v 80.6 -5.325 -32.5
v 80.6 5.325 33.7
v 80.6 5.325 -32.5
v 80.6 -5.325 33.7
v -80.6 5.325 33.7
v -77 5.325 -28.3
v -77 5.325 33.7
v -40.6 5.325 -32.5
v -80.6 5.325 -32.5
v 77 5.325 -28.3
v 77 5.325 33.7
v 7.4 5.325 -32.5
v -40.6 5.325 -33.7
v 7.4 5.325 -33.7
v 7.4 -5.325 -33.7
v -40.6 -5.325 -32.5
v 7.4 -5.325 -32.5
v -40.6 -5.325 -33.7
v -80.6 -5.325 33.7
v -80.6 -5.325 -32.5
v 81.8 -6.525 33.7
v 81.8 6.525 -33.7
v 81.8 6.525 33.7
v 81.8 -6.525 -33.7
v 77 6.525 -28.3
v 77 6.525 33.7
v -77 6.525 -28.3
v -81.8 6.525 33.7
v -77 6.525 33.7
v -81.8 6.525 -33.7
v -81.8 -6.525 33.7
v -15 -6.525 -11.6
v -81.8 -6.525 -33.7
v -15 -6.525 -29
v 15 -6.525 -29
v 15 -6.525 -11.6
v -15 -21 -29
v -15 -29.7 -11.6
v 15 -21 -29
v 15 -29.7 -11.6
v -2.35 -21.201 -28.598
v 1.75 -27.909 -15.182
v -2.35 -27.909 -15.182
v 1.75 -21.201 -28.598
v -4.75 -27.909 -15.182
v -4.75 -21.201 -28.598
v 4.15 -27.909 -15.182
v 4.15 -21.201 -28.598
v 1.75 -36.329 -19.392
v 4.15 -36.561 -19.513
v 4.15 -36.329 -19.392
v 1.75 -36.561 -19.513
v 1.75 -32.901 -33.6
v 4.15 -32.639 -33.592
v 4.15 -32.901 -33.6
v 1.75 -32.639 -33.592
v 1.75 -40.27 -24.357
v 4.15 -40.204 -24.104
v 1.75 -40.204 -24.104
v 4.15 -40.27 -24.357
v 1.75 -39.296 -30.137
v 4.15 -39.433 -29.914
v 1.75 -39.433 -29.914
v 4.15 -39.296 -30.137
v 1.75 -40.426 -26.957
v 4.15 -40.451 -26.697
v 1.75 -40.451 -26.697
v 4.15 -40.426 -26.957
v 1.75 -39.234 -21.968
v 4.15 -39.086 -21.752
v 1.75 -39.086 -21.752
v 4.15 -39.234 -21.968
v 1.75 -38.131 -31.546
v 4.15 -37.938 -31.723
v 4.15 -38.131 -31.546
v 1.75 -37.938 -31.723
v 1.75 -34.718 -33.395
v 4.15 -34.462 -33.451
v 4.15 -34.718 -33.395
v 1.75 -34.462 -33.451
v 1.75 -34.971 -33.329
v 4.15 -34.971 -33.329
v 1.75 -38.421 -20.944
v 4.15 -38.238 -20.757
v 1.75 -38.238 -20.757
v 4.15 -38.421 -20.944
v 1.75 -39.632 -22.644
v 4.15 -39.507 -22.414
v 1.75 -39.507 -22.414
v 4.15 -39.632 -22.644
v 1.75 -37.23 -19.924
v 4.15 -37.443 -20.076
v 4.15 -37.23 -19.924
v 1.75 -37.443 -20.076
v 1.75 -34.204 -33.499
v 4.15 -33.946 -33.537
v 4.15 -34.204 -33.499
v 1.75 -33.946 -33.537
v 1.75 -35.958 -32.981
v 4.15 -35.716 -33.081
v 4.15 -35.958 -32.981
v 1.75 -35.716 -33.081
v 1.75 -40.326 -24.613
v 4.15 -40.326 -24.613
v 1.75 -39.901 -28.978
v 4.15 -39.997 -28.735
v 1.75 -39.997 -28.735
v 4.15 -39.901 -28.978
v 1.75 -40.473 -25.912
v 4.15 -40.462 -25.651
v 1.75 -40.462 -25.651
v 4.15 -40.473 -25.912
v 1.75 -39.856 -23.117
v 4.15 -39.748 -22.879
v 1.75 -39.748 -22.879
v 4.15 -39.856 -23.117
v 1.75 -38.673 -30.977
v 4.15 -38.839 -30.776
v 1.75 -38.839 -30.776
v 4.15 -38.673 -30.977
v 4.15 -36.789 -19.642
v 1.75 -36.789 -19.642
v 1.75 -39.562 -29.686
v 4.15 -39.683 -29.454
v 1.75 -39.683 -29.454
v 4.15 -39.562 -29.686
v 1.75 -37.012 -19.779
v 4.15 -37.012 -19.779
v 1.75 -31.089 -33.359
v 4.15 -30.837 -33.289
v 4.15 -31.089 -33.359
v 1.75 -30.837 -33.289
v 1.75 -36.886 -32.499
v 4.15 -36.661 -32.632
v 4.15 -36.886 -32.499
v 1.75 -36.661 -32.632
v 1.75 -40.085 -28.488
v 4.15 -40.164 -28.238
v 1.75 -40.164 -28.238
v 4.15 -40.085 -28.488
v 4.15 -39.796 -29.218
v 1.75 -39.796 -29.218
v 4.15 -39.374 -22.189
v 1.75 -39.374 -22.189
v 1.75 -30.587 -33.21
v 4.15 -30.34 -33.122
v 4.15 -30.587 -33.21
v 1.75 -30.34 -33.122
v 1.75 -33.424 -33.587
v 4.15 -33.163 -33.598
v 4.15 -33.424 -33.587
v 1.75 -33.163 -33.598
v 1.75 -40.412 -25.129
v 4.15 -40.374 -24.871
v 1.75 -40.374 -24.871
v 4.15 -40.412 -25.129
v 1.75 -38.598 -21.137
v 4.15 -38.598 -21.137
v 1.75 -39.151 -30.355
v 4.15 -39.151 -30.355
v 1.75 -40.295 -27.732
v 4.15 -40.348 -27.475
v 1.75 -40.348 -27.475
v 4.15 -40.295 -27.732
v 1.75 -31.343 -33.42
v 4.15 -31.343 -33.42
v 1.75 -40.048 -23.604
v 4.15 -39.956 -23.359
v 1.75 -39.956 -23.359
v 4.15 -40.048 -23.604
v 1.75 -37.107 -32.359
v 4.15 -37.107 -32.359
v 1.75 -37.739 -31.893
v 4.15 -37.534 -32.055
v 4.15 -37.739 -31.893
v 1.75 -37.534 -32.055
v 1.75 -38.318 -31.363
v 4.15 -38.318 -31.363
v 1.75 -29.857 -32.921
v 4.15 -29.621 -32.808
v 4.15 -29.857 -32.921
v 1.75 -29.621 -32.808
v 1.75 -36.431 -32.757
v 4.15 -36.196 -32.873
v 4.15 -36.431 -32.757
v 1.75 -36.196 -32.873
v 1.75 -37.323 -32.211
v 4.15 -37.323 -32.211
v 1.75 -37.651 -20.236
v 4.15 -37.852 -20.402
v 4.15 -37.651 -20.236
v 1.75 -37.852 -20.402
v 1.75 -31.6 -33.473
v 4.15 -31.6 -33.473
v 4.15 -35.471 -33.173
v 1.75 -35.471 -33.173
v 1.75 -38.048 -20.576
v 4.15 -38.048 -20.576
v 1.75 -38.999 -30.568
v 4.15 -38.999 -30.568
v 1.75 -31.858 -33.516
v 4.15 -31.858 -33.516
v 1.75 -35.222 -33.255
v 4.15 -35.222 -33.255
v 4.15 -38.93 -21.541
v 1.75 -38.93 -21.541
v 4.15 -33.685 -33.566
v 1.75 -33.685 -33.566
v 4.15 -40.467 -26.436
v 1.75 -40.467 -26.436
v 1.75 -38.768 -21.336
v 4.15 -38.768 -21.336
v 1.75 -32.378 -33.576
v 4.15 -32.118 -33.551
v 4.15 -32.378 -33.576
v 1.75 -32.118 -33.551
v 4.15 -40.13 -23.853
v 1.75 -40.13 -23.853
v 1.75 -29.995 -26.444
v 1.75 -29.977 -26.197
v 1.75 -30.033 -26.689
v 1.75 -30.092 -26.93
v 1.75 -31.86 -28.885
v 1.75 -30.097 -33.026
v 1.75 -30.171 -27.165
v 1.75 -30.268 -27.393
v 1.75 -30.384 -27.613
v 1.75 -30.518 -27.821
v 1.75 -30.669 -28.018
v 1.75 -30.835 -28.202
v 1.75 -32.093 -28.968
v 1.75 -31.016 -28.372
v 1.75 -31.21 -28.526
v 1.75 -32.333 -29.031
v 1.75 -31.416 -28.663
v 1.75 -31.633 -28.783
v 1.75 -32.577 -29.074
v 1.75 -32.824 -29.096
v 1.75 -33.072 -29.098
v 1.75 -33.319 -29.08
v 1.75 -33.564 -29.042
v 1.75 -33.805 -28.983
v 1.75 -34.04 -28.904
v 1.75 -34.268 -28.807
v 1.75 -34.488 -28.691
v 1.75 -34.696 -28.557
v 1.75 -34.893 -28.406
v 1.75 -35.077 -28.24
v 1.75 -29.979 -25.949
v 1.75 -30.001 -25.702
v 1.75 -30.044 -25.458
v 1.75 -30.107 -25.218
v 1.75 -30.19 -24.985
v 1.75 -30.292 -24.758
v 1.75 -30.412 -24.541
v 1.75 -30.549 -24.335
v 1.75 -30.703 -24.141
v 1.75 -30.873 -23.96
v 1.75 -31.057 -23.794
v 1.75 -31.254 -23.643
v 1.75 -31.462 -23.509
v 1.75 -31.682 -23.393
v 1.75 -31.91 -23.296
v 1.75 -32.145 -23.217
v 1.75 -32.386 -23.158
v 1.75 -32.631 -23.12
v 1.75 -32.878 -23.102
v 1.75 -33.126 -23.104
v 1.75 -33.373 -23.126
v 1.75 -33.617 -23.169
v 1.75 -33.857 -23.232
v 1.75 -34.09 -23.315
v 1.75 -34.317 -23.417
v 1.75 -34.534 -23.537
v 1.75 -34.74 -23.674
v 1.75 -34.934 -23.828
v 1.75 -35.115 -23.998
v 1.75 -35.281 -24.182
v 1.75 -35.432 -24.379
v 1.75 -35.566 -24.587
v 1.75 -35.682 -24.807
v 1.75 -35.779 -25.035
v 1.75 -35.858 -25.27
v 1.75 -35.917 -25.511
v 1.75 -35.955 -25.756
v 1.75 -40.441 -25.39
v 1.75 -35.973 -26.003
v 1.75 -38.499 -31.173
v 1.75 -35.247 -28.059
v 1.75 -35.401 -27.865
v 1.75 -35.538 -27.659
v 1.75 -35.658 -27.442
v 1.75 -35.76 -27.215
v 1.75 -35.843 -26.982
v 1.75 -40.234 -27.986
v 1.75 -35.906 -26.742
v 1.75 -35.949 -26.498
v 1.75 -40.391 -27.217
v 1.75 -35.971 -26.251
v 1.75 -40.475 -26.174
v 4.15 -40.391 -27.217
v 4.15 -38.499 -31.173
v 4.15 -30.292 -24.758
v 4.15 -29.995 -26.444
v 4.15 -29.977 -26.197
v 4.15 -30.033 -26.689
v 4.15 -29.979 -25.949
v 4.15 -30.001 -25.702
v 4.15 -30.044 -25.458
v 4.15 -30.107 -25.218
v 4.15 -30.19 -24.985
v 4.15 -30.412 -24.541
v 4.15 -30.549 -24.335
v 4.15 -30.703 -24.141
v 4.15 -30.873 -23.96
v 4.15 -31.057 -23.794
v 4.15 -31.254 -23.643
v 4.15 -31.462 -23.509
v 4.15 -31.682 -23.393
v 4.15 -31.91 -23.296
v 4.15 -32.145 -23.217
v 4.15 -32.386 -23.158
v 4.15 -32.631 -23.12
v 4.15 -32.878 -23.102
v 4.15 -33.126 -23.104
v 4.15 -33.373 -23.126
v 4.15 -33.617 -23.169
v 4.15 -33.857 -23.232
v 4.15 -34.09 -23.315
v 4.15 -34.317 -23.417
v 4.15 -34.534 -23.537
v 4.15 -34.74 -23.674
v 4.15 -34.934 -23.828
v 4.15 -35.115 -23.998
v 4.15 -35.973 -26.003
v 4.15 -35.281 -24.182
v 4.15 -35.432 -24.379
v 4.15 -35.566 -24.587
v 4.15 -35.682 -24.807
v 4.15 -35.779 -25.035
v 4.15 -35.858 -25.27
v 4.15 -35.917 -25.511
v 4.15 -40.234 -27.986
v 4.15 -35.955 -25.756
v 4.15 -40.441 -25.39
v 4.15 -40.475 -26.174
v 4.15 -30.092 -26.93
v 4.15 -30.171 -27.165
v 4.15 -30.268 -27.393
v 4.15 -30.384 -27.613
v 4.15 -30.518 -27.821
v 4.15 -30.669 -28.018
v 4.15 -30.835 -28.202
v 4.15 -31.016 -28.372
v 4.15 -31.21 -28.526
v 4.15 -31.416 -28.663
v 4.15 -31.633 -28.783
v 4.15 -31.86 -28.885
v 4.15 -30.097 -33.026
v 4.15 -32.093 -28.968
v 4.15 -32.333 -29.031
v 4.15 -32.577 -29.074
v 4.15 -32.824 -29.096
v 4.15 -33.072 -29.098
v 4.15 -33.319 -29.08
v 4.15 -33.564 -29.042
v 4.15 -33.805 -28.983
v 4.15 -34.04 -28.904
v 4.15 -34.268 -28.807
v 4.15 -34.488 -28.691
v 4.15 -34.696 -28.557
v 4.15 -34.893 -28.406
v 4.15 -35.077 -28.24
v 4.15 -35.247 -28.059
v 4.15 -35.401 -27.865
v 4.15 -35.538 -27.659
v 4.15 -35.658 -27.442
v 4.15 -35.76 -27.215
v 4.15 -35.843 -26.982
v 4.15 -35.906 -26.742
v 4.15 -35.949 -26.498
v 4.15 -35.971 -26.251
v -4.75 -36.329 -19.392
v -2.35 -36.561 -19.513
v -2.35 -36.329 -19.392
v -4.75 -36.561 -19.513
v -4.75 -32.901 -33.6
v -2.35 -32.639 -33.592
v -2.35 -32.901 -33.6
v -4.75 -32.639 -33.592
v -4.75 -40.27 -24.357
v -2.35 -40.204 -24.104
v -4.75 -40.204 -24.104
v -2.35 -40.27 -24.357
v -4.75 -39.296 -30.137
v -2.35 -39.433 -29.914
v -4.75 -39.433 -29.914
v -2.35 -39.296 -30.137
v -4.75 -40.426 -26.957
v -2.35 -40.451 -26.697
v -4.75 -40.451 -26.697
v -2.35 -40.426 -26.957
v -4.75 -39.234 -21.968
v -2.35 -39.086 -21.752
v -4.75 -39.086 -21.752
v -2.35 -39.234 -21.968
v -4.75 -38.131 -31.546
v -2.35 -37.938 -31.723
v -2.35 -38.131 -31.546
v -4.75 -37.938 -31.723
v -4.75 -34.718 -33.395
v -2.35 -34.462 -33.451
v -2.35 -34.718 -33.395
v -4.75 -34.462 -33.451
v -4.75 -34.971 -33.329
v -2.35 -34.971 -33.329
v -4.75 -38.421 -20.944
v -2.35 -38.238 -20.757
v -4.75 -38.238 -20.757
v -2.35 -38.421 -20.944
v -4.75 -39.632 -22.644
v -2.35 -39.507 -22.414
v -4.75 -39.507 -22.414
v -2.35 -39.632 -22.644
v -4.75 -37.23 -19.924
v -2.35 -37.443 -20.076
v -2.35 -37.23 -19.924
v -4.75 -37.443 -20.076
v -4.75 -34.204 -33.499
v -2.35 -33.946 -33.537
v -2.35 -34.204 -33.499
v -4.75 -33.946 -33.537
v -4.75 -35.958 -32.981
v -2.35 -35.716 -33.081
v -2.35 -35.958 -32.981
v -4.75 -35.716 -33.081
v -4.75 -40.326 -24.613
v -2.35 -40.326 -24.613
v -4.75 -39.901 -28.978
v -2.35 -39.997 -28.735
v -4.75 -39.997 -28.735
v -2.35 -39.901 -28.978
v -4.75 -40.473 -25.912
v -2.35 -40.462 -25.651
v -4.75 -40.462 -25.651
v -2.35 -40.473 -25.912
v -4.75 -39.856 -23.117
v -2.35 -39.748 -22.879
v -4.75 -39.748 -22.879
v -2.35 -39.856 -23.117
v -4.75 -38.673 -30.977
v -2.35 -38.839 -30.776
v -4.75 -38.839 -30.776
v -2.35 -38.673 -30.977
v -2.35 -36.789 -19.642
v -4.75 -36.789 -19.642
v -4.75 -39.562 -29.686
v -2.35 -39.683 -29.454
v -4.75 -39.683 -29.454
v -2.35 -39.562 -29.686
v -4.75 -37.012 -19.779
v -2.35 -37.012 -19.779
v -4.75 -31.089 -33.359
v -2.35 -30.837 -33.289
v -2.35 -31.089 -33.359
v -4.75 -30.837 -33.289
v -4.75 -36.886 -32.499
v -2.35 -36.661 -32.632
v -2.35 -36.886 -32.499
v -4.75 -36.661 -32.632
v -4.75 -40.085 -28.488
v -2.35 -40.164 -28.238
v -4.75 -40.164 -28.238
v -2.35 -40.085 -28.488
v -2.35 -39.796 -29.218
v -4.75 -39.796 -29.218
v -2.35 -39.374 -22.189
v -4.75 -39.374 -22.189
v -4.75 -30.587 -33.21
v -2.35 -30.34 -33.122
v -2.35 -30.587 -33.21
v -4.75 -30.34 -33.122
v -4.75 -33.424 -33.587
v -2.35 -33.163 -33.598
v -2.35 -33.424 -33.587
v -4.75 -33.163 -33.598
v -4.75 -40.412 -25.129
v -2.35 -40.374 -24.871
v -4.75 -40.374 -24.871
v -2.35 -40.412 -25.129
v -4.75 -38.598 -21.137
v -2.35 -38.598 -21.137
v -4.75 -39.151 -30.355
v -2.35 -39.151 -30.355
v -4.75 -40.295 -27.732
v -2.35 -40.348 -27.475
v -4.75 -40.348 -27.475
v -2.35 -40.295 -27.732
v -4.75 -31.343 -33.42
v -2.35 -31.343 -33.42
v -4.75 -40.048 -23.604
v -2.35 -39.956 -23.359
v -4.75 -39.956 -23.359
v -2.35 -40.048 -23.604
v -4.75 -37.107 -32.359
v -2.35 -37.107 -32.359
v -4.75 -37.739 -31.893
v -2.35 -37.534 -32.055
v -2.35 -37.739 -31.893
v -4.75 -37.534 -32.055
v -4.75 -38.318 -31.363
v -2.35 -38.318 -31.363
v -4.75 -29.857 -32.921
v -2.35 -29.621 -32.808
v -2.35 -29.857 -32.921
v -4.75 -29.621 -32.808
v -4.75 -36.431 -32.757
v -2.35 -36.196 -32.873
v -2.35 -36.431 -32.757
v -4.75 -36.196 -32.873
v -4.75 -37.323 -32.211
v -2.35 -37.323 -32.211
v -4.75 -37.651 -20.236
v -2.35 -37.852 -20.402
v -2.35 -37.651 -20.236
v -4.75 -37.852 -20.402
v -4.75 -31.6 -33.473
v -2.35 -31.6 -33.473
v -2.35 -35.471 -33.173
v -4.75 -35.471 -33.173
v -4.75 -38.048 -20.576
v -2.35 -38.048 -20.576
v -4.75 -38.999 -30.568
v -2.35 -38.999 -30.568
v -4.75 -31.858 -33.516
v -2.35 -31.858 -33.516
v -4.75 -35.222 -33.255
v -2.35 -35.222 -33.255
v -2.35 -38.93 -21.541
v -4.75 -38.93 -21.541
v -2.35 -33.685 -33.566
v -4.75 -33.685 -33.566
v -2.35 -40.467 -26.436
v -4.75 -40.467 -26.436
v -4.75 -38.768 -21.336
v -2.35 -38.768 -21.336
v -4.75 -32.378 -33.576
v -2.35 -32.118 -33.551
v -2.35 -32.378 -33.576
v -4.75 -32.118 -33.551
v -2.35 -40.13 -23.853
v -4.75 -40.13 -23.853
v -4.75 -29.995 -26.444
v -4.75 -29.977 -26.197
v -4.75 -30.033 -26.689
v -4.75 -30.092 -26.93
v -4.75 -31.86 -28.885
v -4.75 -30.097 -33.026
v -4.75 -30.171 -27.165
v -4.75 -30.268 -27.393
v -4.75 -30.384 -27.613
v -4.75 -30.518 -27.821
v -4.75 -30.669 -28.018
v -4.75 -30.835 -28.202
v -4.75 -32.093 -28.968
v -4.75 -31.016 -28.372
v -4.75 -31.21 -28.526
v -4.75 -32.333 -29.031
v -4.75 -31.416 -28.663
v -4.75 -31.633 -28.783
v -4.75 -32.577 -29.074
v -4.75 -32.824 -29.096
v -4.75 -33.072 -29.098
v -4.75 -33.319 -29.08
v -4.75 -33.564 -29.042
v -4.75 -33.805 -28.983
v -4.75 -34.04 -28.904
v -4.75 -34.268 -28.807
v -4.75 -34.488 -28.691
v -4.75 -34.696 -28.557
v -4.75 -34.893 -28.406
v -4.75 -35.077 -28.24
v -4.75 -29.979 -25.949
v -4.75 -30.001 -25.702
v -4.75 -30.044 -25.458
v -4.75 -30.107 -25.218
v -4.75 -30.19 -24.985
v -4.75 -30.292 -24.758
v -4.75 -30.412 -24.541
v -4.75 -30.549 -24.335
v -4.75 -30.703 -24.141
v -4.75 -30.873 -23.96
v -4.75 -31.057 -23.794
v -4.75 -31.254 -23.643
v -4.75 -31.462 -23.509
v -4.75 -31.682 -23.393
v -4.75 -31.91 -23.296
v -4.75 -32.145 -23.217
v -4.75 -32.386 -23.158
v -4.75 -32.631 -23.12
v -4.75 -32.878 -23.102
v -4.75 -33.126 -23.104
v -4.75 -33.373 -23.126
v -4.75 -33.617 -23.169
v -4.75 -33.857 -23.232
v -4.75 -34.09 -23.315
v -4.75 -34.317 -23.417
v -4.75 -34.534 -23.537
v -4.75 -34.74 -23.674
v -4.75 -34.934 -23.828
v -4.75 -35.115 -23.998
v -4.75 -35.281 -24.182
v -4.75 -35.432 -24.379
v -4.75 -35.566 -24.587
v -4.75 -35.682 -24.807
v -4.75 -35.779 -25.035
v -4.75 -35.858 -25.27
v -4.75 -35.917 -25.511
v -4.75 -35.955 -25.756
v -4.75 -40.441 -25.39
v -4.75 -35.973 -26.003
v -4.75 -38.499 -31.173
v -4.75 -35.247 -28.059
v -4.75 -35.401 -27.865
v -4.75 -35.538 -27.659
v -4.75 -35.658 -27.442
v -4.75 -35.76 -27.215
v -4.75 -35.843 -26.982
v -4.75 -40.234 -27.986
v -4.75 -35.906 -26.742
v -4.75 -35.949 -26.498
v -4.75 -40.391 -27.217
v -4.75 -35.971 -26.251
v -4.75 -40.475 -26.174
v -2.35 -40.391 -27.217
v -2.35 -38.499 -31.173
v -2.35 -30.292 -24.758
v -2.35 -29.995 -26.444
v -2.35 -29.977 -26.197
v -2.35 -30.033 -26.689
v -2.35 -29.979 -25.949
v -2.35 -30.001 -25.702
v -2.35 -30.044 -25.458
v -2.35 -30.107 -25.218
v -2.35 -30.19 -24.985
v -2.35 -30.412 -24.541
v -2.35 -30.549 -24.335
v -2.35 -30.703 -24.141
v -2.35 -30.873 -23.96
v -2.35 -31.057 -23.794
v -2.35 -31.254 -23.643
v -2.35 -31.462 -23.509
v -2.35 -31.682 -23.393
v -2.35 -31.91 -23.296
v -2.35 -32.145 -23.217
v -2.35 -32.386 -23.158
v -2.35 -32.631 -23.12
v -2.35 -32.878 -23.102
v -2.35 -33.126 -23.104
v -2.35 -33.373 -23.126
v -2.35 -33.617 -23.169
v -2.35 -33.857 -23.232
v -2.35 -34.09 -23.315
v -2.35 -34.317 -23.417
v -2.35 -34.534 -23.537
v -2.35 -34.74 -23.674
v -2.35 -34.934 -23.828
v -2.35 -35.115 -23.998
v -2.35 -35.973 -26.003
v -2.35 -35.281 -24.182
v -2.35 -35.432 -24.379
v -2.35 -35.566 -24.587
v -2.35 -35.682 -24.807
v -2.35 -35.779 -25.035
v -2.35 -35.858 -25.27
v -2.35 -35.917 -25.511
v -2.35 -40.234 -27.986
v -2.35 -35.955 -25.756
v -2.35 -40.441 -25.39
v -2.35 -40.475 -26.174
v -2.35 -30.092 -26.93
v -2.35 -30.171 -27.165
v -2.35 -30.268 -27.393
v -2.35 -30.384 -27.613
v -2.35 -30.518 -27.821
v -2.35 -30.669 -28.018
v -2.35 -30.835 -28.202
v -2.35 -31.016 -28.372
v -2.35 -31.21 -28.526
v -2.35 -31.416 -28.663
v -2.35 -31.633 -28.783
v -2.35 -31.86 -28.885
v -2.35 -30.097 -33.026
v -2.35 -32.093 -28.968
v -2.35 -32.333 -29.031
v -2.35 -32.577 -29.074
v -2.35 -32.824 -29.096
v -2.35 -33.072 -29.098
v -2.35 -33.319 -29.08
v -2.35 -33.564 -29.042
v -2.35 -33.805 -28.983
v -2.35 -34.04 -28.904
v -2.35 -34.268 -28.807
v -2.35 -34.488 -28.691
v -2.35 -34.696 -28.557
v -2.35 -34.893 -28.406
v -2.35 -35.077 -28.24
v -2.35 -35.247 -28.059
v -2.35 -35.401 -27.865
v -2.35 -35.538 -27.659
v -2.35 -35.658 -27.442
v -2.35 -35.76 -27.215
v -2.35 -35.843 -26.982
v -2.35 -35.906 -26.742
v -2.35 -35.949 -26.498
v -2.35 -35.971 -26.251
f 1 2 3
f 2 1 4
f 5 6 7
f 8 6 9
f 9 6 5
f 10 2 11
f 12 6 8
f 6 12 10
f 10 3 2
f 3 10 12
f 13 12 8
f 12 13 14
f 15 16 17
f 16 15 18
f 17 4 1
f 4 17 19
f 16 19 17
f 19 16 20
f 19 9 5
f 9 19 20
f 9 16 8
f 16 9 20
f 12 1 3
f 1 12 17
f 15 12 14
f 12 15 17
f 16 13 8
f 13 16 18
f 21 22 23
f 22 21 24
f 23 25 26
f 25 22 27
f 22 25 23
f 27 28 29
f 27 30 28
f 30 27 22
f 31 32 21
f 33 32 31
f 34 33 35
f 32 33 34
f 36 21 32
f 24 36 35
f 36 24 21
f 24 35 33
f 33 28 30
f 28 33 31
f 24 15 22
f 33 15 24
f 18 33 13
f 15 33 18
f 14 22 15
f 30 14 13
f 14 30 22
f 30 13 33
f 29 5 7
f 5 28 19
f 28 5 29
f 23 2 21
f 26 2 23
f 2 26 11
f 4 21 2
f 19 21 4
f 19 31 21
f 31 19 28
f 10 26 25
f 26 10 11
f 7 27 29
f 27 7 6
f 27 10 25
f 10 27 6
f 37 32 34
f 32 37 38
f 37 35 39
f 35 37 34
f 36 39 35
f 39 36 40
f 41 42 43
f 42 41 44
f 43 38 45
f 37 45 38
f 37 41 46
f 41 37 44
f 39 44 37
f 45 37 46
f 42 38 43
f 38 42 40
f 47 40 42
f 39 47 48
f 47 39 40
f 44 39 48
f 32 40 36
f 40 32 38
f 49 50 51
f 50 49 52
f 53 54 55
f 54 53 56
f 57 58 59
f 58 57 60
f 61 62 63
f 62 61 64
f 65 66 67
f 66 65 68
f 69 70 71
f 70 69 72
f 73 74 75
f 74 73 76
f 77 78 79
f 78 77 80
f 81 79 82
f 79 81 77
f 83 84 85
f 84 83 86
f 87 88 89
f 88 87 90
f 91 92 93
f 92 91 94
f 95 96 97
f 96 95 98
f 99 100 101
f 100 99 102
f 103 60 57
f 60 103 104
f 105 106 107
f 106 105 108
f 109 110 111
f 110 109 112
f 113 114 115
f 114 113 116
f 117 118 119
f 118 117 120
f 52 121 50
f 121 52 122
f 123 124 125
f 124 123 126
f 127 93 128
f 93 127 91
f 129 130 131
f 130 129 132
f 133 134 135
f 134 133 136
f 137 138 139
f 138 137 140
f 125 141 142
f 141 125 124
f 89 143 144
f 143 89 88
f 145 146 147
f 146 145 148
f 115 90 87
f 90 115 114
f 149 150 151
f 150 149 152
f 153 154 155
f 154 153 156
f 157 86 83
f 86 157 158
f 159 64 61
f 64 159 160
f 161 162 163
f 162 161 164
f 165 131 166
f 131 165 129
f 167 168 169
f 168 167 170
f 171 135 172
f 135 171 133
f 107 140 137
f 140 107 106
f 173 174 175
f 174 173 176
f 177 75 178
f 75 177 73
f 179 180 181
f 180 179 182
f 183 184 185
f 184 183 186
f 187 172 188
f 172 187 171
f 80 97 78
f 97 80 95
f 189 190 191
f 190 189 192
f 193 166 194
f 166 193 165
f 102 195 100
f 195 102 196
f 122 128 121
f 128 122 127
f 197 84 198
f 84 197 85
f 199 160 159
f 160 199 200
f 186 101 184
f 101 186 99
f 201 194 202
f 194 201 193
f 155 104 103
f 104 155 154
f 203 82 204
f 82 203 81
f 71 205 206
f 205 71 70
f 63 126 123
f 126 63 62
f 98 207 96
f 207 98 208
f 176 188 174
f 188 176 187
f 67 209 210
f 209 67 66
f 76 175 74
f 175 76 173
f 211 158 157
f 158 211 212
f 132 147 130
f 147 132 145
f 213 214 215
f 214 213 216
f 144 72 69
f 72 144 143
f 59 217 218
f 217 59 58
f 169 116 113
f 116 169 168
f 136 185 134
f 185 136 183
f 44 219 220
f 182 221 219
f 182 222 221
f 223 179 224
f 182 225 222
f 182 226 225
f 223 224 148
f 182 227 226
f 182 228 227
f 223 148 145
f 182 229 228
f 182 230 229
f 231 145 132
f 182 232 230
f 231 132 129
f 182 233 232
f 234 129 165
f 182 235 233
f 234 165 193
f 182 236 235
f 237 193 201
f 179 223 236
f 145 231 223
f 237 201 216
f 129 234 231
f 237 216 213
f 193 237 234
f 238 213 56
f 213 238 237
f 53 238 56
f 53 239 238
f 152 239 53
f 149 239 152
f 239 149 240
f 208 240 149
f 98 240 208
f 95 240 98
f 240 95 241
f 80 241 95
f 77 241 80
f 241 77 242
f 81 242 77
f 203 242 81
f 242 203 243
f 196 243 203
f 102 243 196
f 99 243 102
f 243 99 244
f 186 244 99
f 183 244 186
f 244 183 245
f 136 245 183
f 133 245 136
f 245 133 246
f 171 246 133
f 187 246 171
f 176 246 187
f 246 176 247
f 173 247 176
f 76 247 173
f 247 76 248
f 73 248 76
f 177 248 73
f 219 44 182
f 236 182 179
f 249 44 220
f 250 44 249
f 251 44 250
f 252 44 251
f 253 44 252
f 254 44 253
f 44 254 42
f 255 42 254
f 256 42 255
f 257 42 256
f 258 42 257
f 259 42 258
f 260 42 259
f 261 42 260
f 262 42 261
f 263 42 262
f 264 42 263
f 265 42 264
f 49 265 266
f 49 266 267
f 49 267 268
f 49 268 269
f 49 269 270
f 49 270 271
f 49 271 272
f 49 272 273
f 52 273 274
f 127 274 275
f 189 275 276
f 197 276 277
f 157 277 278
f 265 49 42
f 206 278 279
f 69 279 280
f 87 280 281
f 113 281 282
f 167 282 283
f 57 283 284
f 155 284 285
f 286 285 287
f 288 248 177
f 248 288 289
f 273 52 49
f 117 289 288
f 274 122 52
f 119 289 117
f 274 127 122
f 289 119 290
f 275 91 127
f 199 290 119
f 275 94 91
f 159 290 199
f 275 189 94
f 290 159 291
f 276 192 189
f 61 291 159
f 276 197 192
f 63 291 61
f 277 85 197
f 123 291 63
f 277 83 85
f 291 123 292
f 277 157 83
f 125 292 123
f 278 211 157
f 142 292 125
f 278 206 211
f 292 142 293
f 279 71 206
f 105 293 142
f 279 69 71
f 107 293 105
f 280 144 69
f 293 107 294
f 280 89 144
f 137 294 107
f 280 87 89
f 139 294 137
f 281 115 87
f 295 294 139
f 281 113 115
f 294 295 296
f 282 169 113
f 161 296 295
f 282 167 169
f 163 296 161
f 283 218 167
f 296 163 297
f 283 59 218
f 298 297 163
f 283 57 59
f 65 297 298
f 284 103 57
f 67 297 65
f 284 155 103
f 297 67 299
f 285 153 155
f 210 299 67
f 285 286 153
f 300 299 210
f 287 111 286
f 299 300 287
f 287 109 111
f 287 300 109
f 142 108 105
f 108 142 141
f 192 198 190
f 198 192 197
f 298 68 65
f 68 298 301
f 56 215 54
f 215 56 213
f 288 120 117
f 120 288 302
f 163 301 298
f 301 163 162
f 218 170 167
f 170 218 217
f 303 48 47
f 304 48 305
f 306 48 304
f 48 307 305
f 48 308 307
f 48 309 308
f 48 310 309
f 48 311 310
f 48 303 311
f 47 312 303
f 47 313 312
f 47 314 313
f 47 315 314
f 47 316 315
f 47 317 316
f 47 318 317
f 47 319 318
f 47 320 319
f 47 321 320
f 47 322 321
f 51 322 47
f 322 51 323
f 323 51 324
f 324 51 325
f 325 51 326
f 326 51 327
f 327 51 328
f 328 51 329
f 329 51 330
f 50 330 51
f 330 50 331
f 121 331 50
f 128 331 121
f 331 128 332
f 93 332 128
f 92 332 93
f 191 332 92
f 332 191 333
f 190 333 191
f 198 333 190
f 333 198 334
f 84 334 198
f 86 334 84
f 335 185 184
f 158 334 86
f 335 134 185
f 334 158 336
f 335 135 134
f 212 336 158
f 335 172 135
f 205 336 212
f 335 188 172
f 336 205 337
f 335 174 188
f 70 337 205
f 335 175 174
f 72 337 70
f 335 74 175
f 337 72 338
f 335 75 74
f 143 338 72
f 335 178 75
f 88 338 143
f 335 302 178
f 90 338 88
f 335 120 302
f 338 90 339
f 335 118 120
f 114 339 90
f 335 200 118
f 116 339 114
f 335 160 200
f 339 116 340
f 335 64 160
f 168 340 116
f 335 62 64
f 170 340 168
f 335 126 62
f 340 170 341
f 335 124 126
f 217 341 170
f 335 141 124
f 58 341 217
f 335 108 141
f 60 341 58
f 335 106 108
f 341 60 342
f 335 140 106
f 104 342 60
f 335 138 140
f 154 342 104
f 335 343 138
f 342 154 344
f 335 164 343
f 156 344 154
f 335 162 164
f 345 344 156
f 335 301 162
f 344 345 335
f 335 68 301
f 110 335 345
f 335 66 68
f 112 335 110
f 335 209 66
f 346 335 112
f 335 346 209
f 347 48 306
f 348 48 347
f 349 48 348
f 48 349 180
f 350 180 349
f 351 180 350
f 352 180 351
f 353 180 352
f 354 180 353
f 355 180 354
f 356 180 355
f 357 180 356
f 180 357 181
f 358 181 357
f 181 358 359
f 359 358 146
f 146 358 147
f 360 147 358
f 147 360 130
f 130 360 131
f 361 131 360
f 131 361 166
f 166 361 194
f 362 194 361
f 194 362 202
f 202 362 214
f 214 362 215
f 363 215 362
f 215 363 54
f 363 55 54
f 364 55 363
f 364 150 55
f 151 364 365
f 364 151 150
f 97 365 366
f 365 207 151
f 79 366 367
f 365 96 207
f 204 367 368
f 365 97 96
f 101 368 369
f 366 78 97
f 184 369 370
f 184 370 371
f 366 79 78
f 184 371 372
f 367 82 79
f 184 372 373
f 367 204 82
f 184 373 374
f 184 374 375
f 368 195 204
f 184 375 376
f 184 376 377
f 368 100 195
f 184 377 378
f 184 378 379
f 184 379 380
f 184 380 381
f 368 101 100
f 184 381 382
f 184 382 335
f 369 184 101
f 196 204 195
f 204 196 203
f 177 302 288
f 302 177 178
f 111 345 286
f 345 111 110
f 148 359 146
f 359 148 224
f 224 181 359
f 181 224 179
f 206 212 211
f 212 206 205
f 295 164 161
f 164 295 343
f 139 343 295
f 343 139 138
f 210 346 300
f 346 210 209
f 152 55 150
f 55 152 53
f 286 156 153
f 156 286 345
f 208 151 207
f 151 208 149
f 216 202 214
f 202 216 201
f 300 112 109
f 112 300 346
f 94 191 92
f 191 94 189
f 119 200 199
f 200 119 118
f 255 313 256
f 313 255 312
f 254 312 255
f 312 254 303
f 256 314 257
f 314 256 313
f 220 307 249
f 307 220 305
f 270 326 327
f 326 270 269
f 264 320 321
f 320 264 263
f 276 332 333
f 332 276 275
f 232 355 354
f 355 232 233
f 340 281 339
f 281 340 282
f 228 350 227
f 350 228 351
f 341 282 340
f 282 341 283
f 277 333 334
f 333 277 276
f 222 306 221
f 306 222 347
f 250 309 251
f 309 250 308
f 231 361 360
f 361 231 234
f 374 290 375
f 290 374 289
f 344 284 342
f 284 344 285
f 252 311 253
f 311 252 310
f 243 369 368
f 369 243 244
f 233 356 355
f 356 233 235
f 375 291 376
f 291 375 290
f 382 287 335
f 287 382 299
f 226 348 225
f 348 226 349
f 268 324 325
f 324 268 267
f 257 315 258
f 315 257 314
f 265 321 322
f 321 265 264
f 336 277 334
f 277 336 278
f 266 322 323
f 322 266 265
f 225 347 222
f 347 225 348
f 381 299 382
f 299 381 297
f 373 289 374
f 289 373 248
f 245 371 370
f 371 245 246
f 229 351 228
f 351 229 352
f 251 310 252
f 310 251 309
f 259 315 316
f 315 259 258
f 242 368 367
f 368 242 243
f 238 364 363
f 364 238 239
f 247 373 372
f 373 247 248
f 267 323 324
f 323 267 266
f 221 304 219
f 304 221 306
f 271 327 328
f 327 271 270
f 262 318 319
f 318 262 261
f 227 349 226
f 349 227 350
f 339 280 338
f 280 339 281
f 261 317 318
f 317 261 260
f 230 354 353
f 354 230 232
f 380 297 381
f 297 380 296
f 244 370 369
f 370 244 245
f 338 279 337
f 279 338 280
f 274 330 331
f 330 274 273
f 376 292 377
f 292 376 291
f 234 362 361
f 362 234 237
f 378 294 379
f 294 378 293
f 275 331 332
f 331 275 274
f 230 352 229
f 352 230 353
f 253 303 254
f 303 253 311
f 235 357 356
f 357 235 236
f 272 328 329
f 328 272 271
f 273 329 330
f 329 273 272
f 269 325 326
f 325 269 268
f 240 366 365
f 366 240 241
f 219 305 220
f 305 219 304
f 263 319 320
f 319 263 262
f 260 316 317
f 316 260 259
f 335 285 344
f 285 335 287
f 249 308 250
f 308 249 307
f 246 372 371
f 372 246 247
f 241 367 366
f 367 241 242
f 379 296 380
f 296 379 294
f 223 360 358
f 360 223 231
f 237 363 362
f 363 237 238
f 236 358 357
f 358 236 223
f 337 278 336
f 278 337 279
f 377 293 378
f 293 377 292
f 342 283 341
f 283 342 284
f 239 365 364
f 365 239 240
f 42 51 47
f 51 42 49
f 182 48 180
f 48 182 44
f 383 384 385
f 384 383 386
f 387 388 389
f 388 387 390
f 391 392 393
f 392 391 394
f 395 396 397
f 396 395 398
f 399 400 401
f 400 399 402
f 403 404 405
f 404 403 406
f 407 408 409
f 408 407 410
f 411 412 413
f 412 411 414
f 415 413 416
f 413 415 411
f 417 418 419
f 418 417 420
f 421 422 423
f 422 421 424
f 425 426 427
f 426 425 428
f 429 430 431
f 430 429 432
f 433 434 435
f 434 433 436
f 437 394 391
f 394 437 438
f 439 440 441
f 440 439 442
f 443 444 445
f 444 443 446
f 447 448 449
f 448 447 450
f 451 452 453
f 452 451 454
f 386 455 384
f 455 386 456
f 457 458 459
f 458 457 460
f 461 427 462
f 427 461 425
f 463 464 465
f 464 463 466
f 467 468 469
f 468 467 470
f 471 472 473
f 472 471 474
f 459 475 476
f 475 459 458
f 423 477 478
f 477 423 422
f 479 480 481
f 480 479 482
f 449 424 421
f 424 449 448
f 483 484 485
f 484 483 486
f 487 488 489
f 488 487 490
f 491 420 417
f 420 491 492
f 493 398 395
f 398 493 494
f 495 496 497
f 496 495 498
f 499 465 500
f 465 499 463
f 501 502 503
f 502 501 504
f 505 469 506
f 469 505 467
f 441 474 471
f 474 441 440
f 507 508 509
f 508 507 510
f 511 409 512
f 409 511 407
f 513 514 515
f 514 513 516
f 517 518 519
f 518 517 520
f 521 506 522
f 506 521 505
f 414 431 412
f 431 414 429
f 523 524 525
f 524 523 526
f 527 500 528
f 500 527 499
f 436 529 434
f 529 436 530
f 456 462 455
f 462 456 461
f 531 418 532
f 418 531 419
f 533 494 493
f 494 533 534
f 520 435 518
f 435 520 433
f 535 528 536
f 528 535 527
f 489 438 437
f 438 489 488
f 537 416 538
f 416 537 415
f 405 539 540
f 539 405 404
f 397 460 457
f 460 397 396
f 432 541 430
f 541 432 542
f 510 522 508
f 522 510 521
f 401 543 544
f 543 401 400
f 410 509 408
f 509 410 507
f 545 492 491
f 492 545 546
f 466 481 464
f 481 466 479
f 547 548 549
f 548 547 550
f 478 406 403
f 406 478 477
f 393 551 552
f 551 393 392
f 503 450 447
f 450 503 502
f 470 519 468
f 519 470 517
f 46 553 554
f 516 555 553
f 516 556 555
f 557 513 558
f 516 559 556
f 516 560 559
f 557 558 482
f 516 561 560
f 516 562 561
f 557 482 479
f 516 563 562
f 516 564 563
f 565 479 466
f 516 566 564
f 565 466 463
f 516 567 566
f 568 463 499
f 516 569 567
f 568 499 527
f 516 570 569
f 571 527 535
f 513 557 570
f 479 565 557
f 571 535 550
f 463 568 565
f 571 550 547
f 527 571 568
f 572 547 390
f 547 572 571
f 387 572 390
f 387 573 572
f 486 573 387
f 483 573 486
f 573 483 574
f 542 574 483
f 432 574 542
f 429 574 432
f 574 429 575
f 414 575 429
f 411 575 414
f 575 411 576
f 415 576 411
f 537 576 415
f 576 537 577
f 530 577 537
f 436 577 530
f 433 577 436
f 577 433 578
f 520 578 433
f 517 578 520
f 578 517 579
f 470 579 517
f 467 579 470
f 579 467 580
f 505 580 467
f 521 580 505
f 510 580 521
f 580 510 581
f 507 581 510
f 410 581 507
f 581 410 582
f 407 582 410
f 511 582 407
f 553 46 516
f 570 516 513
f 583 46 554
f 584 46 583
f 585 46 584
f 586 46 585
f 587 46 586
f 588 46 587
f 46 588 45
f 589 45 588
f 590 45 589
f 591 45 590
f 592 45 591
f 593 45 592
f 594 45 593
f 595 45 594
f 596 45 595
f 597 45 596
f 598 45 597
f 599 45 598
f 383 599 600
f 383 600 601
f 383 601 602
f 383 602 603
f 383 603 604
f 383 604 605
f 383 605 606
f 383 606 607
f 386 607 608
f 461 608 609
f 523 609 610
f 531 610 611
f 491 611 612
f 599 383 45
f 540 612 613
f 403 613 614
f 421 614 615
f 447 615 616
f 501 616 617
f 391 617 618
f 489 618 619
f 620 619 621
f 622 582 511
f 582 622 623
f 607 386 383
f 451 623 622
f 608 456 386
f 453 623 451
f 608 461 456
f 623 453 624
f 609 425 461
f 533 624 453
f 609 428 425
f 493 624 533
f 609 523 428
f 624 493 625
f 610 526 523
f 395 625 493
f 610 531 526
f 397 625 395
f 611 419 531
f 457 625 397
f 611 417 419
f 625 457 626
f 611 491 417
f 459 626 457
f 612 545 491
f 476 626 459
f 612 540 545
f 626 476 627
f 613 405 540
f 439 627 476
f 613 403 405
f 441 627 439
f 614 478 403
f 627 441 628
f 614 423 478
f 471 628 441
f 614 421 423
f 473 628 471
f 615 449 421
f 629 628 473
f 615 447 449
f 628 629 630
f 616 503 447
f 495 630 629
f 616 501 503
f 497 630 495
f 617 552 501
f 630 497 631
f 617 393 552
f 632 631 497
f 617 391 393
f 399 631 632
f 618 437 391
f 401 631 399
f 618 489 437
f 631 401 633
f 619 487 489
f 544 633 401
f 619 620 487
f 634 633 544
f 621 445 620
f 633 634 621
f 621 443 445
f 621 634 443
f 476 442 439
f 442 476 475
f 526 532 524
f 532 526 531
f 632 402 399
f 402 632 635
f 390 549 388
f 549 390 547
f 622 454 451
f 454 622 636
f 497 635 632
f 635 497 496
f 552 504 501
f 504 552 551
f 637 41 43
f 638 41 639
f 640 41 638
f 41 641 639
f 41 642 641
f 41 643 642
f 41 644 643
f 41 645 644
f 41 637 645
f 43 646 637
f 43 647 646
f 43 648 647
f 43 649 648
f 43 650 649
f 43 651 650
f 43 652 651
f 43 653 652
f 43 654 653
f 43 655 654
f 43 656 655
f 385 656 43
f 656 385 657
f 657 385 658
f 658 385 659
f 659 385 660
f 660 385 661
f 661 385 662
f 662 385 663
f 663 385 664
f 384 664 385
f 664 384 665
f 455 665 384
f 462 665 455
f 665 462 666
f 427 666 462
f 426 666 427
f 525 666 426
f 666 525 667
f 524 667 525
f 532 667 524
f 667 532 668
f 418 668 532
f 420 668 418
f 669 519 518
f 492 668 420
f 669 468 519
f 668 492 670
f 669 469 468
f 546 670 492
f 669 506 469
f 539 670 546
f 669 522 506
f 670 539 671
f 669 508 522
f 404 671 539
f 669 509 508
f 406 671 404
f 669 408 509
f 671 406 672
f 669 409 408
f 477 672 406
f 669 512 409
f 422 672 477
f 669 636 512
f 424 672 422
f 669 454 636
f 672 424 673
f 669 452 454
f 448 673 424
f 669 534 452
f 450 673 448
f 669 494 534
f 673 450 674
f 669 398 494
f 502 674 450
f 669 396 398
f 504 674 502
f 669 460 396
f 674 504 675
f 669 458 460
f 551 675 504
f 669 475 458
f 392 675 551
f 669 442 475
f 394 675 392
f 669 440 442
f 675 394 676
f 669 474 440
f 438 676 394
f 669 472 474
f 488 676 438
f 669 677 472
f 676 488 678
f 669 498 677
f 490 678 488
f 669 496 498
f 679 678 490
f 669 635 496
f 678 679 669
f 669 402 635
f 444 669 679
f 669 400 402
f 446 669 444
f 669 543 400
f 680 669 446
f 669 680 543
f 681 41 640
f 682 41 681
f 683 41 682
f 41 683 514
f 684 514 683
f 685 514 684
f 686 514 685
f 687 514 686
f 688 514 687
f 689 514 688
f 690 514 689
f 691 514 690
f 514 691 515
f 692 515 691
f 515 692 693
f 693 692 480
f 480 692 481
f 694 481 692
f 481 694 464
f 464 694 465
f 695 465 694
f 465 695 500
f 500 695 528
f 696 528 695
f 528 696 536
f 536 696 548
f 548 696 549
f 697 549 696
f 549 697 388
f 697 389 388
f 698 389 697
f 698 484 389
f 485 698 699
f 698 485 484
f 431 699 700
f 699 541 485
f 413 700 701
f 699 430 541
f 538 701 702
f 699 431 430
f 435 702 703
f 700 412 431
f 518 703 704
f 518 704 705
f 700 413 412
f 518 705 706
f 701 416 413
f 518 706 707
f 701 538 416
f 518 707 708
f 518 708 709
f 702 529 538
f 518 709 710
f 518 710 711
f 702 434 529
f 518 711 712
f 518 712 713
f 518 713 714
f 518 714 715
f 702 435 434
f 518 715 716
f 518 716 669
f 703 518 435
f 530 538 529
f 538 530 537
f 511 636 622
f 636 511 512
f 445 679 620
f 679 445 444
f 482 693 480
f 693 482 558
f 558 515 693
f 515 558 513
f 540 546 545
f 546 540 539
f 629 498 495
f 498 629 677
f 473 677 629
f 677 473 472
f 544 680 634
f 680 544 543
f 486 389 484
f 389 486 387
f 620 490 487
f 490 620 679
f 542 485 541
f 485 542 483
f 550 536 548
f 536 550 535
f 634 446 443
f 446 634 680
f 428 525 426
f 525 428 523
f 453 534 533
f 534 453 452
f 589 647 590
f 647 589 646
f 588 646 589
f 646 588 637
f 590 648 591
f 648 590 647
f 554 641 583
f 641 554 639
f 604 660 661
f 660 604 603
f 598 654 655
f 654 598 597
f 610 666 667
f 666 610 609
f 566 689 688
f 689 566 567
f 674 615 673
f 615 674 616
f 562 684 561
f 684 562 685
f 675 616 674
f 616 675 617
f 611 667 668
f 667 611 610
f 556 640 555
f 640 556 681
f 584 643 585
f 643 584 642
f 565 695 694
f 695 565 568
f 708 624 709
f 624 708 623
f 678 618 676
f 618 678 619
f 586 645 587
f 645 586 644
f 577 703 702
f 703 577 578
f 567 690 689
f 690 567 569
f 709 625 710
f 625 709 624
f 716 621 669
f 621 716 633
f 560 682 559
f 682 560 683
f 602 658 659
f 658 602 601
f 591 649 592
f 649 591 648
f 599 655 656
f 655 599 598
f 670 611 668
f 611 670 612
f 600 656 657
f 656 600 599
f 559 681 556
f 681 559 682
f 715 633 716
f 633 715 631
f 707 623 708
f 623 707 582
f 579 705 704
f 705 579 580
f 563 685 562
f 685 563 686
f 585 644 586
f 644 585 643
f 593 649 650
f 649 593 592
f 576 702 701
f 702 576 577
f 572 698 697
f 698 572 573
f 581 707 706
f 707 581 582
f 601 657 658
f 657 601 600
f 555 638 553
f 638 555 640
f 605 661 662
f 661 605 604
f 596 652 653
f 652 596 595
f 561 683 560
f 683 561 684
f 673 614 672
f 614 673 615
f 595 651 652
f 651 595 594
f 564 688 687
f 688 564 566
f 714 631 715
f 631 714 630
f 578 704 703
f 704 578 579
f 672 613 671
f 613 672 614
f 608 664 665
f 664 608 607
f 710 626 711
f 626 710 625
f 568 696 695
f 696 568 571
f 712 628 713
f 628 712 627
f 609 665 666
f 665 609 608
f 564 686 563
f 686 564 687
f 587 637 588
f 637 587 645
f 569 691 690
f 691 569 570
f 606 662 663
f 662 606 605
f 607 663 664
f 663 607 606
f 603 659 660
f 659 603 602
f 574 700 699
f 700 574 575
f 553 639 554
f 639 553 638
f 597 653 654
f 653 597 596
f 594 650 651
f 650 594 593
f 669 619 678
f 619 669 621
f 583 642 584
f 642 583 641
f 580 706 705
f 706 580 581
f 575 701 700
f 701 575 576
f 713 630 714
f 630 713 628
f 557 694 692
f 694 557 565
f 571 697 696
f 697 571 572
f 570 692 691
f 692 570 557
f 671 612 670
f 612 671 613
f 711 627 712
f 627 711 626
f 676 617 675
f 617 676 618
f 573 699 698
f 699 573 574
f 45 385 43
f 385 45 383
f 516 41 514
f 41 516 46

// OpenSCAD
// file: ../wiki-yoinks/prism.scad
module prism(l, w, h) {
    // from wiki
    // https://en.wikibooks.org/wiki/OpenSCAD_User_Manual/Primitive_Solids#polyhedron
    // Falls under Attribution-ShareAlike 3.0 Unported https://creativecommons.org/licenses/by-sa/3.0/ 
    // as specified on the user manual https://en.wikibooks.org/wiki/OpenSCAD_User_Manual
    polyhedron(points =
                   [
                       [ 0, 0, 0 ], [ l, 0, 0 ], [ l, w, 0 ], [ 0, w, 0 ],
                       [ 0, w, h ], [ l, w, h ]
                   ],
               faces = [
                   [ 0, 1, 2, 3 ], [ 5, 4, 3, 2 ], [ 0, 4, 5, 1 ], [ 0, 3, 4 ],
                   [ 5, 2, 1 ]
               ]);
}
// file: GoPro_Mount.scad
// slightly modified version of https://www.thingiverse.com/thing:3088912/files

// Associated BSD License
// Copyright 2022 Julietta
// Redistribution and use in source and binary forms, with or without modification, are permitted provided that the following conditions are met:
// 1. Redistributions of source code must retain the above copyright notice, this list of conditions and the following disclaimer.
// 2. Redistributions in binary form must reproduce the above copyright notice, this list of conditions and the following disclaimer in the documentation and/or other materials provided with the distribution.
// THIS SOFTWARE IS PROVIDED BY THE COPYRIGHT HOLDERS AND CONTRIBUTORS "AS IS" AND ANY EXPRESS OR IMPLIED WARRANTIES, INCLUDING, BUT NOT LIMITED TO, THE IMPLIED WARRANTIES OF MERCHANTABILITY AND FITNESS FOR A PARTICULAR PURPOSE ARE DISCLAIMED. IN NO EVENT SHALL THE COPYRIGHT HOLDER OR CONTRIBUTORS BE LIABLE FOR ANY DIRECT, INDIRECT, INCIDENTAL, SPECIAL, EXEMPLARY, OR CONSEQUENTIAL DAMAGES (INCLUDING, BUT NOT LIMITED TO, PROCUREMENT OF SUBSTITUTE GOODS OR SERVICES; LOSS OF USE, DATA, OR PROFITS; OR BUSINESS INTERRUPTION) HOWEVER CAUSED AND ON ANY THEORY OF LIABILITY, WHETHER IN CONTRACT, STRICT LIABILITY, OR TORT (INCLUDING NEGLIGENCE OR OTHERWISE) ARISING IN ANY WAY OUT OF THE USE OF THIS SOFTWARE, EVEN IF ADVISED OF THE POSSIBILITY OF SUCH DAMAGE.


$fa = 2;
$fs = 0.25;
Extra_Mount_Depth = 3;

module flap(Width) {
    rotate([ 90, 0, 0 ]) {
        translate([ 3.5, (-7.5), 0 ]) cube([ 4 + Extra_Mount_Depth, 15, Width ]);

        translate([ 0, (-7.5), 0 ]) cube([ 7.5 + Extra_Mount_Depth, 4, Width ]);

        translate([ 0, 3.5, 0 ]) cube([ 7.5 + Extra_Mount_Depth, 4, Width ]);

        difference() {
            cylinder(h = Width, d = 15);

            translate([ 0, 0, (-1) ]) cylinder(h = Width + 2, d = 6);
        }
    }
}

module mount2(flapWidth = 3) {
    translate([ 0, 4, 0 ]) flap(flapWidth);
    translate([ 0, 10.5, 0 ]) flap(flapWidth);
}

module mount3(flapWidth = 3)
{
    
    module nut_hole()
    {
        rotate([0, 90, 0]) // (Un)comment to rotate nut hole
        rotate([90, 0, 0])
            for(i = [0:(360 / 3):359])
            {
                rotate([0, 0, i])
                    cube([4.6765, 8.1, 5], center = true);
            }
    }

    difference()
    {
        translate([0, (-2.5), 0])
            flap(8);

        translate([0, (-8.5), 0])
            nut_hole();
    }

    mount2(flapWidth);
}
// main file
use <GoPro_Mount.scad>
use <../wiki-yoinks/prism.scad>

phoneCaseThickness = 10.65;
usableHeight = 65;
phoneLength = 161.2;
phoneWidth = 130;

buttonStart = 40;
buttonArea = 48;

holderThickness = 2.4;
flapWidth = 2.4;

module Phone() {
    color([ 75 / 255, 0 / 255, 0 / 255 ]) {
        cube(size = [ phoneLength, phoneWidth, phoneCaseThickness ], center = true);

    }
    color([0/255, 75/255, 75/255]) {
        translate([-phoneLength/2 + buttonArea/2+buttonStart,phoneWidth/2,0])
        {
            cube([buttonArea,15,phoneCaseThickness],center=true);
        }
    }
}

module ZFoldHolder() {
    dim = [ phoneLength + holderThickness, usableHeight + holderThickness, phoneCaseThickness + holderThickness ];
    color([ 75 / 255, 75 / 255, 75 / 255 ]) {
        difference() {
            cube(dim, center = true);

            translate([ 0, -holderThickness - 3, phoneCaseThickness / 2 ]) {
                cube(size = [ phoneLength - holderThickness * 3, usableHeight + holderThickness, phoneCaseThickness ],
                     center = true);
            }
            translate([ 0, -usableHeight / 2, 0 ]) {
                Phone();
            }
        }
    }

    l = 30;
    h = 15;
    cDist= l/2;
    translate([0,-3.4,-cDist+10]){
        difference(){
            rotate([270,180,00])
            translate([-l/2, -31, holderThickness]) {
                translate([0, h, 0]) {
                cube(size=[l, cDist, l]);
                }
                prism(l,h,30);
                
            }
            translate([-50,0,-50])
            cube([100,15,100]);
            }
            translate([ 5.75, 5+usableHeight / 2 - 8, -12-phoneCaseThickness * 1.5 ]) {
                rotate([ 0, -116.565, 90 ]) mount2(flapWidth);
        }
    }
}

rotate([ -90, 0, 0 ]) {
    ZFoldHolder();
}


//Test prints for the joints

// translate([0,6,-10])
// cube(size=[15, 10, 3], center= true);
// rotate([ 0, 90, 0 ]) mount2();

// translate([0, 0, -10]) 
// cube(size=[15, 21, 2], center = true);
// rotate([ 0, 90, 0 ]) mount3(3);
        
